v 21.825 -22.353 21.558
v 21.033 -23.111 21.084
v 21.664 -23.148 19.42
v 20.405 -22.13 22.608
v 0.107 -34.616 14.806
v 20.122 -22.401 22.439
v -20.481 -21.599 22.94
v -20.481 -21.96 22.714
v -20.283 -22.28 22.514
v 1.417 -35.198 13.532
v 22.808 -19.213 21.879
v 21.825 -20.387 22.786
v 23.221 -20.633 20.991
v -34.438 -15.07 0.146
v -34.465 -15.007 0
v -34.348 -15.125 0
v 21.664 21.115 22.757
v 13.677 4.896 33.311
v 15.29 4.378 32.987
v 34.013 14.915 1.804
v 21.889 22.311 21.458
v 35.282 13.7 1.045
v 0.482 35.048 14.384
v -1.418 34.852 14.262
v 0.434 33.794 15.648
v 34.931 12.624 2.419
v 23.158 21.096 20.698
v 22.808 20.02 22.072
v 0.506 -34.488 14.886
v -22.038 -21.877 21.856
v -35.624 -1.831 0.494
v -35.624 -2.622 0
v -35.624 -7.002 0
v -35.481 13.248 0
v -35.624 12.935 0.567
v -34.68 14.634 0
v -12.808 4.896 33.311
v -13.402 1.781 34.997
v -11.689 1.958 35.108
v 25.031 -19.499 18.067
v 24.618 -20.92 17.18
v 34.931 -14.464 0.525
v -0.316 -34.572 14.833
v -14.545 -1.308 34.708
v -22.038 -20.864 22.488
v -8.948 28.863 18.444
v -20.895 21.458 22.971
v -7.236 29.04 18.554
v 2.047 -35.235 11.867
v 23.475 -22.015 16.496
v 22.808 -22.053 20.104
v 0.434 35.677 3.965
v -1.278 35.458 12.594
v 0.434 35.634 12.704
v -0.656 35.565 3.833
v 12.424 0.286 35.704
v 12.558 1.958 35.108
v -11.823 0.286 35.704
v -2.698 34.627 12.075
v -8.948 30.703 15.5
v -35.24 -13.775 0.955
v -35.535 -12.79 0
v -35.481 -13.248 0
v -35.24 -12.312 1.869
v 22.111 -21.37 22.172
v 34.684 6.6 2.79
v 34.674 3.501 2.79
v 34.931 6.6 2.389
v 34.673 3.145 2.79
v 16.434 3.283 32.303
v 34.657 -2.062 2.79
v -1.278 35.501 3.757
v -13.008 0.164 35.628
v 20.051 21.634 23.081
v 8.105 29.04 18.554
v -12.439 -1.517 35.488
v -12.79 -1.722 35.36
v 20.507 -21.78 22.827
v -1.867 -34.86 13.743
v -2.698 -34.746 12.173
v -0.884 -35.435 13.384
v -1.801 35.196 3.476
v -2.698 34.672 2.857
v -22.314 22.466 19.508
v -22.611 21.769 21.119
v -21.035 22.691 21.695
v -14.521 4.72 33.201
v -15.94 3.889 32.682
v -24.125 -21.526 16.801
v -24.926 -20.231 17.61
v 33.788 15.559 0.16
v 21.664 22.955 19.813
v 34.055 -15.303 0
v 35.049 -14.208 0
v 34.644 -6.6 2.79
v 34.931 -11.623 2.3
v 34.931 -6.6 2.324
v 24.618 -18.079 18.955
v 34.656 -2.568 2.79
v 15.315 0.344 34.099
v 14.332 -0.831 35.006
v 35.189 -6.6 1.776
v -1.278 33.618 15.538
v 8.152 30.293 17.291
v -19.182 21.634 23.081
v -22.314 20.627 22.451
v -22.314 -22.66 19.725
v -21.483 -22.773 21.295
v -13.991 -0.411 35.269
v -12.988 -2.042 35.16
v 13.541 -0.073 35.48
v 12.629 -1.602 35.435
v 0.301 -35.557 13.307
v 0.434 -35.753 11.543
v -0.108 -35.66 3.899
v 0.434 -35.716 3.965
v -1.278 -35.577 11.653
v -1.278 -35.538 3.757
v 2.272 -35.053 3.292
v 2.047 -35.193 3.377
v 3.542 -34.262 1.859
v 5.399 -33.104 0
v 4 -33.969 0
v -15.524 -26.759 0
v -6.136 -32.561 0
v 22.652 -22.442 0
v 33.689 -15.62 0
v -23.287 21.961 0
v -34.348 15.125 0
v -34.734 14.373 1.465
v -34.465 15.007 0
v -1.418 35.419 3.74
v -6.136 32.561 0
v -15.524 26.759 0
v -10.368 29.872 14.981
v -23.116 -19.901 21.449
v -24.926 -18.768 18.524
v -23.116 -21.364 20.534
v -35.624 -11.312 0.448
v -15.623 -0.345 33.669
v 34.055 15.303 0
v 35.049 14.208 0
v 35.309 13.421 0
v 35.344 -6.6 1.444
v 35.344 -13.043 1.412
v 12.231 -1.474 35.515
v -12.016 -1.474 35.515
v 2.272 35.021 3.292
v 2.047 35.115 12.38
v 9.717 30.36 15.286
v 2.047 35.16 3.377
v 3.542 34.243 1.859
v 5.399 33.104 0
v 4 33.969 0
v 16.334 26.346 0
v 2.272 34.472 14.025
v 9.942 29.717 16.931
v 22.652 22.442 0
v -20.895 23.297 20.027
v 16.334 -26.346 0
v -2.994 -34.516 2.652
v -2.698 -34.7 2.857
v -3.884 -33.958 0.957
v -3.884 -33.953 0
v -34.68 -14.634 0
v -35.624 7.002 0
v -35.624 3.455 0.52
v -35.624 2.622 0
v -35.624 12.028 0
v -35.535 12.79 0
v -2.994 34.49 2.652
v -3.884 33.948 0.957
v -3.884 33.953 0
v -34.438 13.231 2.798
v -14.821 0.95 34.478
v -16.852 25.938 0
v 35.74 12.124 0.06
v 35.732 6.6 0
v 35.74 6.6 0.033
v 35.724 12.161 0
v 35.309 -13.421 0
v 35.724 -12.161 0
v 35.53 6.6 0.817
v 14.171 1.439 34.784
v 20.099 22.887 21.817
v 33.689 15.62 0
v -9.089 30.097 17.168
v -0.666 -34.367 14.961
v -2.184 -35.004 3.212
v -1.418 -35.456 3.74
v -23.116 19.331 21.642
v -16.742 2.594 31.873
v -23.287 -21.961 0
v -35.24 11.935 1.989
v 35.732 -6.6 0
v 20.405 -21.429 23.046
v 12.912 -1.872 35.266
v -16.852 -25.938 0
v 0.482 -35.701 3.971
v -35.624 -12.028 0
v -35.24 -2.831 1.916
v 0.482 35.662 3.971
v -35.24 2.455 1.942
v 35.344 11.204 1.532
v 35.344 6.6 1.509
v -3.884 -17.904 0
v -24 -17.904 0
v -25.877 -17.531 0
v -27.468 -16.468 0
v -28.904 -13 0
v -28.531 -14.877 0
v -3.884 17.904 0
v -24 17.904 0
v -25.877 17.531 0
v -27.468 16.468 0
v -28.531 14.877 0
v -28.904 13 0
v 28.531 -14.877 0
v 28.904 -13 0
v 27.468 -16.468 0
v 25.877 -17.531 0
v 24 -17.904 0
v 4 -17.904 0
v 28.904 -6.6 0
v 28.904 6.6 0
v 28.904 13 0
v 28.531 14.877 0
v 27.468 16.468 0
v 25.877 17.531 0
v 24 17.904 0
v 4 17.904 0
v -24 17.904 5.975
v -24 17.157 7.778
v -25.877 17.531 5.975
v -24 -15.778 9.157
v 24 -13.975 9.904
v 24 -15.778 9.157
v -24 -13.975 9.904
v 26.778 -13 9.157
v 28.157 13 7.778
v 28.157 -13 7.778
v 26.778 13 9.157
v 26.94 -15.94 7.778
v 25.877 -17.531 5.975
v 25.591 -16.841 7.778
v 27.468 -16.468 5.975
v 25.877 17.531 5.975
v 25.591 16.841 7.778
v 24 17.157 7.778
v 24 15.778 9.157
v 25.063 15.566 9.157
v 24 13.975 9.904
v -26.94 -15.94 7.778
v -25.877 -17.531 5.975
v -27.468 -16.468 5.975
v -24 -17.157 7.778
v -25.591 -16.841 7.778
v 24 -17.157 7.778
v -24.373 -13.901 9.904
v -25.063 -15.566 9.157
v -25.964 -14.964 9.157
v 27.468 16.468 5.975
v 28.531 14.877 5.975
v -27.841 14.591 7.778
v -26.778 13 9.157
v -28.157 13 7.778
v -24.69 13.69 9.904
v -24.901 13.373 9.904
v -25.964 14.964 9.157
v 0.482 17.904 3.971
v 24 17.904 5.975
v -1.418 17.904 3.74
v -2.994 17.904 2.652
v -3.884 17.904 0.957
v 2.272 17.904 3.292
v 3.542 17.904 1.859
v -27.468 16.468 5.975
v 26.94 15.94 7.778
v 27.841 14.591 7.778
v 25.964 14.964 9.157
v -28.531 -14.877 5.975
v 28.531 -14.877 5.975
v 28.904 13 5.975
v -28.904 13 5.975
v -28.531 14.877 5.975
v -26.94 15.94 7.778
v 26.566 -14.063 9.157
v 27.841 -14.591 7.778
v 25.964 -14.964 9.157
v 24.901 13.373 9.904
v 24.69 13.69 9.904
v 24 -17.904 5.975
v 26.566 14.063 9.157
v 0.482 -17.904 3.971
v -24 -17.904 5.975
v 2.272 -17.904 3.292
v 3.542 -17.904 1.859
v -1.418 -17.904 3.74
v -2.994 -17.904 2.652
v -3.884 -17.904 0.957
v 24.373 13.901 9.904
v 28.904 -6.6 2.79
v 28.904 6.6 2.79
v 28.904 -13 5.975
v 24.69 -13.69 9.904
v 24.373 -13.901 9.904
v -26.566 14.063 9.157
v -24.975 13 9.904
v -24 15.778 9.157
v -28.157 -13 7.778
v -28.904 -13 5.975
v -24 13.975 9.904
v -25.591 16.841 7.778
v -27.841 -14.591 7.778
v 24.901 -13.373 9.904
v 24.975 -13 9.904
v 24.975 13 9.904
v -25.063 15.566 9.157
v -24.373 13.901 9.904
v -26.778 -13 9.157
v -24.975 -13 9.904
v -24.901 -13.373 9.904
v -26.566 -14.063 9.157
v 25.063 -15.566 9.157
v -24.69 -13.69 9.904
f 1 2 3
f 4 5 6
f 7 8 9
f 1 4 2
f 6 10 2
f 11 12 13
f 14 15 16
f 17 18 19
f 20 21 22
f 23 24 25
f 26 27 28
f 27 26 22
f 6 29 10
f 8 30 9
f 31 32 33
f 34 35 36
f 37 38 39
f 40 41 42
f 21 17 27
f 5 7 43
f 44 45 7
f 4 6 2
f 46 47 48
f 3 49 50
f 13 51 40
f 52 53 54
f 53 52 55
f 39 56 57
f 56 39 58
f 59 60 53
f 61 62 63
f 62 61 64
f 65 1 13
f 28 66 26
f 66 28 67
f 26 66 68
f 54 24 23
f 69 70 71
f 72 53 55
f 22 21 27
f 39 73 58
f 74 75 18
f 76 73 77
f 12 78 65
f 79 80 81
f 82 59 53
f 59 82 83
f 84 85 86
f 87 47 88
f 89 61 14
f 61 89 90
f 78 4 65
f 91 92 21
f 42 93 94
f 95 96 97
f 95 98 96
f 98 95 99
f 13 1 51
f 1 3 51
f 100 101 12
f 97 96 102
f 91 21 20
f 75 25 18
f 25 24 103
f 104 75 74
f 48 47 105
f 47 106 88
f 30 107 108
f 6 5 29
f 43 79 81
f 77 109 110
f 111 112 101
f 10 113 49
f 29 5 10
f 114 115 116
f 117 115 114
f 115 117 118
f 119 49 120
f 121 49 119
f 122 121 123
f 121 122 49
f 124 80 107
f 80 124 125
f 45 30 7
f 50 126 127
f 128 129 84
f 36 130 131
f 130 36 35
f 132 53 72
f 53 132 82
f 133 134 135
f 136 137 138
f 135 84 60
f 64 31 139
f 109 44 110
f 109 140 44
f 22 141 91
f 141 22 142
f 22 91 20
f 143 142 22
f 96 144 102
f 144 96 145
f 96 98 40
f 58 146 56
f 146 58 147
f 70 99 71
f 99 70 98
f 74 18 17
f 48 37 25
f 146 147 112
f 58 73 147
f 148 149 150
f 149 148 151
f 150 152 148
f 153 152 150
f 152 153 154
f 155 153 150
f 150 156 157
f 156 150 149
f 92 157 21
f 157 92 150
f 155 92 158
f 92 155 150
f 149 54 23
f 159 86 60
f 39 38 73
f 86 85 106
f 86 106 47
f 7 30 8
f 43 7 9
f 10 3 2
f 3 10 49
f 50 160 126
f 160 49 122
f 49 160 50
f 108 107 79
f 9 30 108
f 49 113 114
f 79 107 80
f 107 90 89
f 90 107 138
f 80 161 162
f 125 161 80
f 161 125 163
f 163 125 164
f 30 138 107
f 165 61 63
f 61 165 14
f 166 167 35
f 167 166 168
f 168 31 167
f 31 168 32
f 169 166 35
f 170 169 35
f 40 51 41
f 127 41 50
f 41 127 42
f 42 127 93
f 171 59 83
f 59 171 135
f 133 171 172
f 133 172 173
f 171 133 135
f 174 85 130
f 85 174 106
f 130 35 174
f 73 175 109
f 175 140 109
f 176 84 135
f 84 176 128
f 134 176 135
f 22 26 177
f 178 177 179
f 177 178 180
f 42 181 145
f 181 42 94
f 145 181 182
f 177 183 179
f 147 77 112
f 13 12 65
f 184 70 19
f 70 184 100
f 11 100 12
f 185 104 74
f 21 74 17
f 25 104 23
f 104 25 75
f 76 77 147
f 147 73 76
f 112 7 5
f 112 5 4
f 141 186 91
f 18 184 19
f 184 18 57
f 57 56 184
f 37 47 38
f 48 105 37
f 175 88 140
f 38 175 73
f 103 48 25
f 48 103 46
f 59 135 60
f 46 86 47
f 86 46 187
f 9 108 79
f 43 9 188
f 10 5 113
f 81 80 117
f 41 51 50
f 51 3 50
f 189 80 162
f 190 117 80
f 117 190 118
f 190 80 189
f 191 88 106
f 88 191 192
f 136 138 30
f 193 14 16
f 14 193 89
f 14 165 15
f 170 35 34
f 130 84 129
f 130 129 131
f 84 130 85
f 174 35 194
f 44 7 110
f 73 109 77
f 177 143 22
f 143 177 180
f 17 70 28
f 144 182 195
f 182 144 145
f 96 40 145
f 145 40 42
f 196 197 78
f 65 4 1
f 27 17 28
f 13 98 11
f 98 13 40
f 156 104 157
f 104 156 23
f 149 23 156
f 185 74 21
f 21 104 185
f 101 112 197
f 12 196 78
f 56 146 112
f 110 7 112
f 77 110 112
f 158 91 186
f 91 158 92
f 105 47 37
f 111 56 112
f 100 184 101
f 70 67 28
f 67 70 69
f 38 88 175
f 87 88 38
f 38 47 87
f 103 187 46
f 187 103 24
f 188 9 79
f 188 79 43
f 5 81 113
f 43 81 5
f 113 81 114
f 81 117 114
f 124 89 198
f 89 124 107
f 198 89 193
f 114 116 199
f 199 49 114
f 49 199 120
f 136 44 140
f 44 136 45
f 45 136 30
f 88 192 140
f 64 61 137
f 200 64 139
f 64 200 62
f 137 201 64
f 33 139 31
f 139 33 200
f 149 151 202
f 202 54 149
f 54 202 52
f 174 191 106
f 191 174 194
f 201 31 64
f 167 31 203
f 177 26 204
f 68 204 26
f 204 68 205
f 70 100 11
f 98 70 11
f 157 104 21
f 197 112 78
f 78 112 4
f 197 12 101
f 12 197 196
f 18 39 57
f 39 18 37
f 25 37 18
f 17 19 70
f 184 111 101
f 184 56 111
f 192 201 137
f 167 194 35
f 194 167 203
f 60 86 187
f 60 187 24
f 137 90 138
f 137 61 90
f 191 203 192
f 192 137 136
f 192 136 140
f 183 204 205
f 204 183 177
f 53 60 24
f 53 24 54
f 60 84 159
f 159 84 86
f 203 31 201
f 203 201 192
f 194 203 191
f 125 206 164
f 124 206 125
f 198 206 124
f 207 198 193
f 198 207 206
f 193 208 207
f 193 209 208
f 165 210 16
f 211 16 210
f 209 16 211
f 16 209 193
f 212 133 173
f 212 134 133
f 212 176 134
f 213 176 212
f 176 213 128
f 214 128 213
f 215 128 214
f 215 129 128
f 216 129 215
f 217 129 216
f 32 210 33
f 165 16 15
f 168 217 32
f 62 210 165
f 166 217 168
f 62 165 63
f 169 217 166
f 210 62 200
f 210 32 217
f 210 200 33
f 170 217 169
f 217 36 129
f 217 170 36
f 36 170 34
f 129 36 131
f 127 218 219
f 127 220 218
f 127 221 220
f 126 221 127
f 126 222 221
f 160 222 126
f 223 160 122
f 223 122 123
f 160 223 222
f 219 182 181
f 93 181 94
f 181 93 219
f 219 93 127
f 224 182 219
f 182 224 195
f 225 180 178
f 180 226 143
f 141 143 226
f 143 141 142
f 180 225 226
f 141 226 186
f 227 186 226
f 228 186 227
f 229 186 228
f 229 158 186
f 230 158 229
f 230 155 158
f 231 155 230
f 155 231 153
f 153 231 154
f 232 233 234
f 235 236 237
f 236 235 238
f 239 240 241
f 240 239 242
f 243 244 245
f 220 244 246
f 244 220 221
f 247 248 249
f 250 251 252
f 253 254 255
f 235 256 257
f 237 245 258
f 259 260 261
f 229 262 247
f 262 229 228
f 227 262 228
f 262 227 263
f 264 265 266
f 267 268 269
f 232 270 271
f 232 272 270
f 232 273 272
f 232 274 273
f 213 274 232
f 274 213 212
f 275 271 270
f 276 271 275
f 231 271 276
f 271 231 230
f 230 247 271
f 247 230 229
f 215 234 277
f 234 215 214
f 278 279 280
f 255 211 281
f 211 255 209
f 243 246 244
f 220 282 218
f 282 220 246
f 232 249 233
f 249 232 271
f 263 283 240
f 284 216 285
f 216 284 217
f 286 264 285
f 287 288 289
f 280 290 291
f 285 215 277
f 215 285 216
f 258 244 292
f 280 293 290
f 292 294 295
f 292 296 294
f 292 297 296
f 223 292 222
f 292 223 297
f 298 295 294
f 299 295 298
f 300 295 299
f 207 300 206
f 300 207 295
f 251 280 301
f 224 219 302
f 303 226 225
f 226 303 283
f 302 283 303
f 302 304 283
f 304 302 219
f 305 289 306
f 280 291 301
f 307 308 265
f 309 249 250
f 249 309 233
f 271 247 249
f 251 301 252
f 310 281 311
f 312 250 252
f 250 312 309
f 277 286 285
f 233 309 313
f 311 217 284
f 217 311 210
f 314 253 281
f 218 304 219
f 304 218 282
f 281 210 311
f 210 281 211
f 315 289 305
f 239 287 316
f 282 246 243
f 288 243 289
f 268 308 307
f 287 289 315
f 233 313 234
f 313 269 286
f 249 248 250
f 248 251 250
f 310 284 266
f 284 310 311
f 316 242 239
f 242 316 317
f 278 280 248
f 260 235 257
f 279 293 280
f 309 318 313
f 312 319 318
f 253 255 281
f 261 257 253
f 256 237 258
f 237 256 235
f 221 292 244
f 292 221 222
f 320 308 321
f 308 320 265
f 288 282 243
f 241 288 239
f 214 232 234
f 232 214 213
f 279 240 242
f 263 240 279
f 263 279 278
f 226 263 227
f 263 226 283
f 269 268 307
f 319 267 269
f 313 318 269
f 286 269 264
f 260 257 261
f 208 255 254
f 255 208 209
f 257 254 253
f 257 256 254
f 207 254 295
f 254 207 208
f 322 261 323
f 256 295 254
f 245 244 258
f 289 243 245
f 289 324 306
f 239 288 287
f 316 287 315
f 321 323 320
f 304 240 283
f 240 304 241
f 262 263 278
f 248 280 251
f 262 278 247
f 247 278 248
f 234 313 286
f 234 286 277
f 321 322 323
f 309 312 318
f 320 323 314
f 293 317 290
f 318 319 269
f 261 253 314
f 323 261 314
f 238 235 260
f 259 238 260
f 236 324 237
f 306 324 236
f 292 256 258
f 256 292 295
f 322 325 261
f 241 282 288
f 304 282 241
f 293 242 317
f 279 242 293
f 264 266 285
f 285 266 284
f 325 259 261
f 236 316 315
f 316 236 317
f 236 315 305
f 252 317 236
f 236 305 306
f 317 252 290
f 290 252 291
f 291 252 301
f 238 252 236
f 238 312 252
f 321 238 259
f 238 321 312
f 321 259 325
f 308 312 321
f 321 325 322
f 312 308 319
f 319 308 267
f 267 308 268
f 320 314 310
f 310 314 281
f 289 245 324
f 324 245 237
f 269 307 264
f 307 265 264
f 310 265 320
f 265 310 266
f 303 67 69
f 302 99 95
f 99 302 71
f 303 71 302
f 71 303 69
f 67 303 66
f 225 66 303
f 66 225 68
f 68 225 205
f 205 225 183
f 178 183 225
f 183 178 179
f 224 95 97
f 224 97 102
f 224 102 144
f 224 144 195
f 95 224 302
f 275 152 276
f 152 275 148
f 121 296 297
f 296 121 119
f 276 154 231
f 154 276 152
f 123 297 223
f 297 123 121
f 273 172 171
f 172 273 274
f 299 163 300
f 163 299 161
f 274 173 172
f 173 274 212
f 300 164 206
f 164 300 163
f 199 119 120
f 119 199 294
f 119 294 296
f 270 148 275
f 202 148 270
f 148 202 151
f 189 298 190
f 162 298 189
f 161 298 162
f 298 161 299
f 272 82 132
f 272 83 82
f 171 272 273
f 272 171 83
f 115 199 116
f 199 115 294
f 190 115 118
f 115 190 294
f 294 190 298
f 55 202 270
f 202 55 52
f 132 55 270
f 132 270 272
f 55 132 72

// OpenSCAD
//include <./Icosahedron-solid.scad>
//$fa=0.1;
//$fs=0.1;

scale = 41;
pinPitch = 2.54;
numPins = 5;
numRows = 2;
headerHeight = 9;
fitGap = 0.5;

holeRadius = 4;

module reg_polygon(sides,radius)
{
  function dia(r) = sqrt(pow(r*2,2)/2);  //sqrt((r*2^2)/2) if only we had an exponention op
  if(sides<2) square([radius,0]);
  if(sides==3) triangle(radius);
  if(sides==4) square([dia(radius),dia(radius)],center=true);
  if(sides>4) circle(r=radius,$fn=sides);
}

module pentagon(radius)
{
  reg_polygon(5,radius);
}

module dodecahedron(height) 
{
    scale([height,height,height]) //scale by height parameter
    {
        intersection()
		  {
            //make a cube
            cube([2,2,1], center = true); 
            intersection_for(i=[0:4]) //loop i from 0 to 4, and intersect results
            { 
                //make a cube, rotate it 116.565 degrees around the X axis,
                //then 72*i around the Z axis
                rotate([0,0,72*i])
                rotate([116.565,0,0])
                cube([2,2,1], center = true); 
            }
        }
    }
}



//scale(scale) show_solid(solid_1);

difference() {
	 rotate([32, 0, 0]) {
	 	  minkowski() {
		  	   dodecahedron(54);
    	      //scale(scale) show_solid(solid_1);
		      sphere(4);
		  }
	 }
    translate([10,0,-1.5*scale])
        cube(scale*3, true);
    arduinoSpace();
    translate([scale - headerHeight, 0, 0])
        cube([headerHeight, numPins*pinPitch + fitGap, numRows*pinPitch + fitGap],true);
	 rotate([90,0,0])
	     cylinder(scale*2,holeRadius,holeRadius,true);
}

module arduinoSpace() {
    minkowski() {
        cube([48,26,10],true);
        sphere(5);
    }
}

/*rotate([0,0,180]) {
translate([-27,0,17]) {
rotate([0,-58,0]) {
color("blue") {
    minkowski() {
	     pentagon(0.75*25.4);
	     circle(0.0787402*25.4);
    }
}
}}}*/

/*translate([0,0,scale*0.77])
    rotate([0,0,0])
        color("gray")
            linear_extrude(1)
                circle(d=scale, true);
*/
